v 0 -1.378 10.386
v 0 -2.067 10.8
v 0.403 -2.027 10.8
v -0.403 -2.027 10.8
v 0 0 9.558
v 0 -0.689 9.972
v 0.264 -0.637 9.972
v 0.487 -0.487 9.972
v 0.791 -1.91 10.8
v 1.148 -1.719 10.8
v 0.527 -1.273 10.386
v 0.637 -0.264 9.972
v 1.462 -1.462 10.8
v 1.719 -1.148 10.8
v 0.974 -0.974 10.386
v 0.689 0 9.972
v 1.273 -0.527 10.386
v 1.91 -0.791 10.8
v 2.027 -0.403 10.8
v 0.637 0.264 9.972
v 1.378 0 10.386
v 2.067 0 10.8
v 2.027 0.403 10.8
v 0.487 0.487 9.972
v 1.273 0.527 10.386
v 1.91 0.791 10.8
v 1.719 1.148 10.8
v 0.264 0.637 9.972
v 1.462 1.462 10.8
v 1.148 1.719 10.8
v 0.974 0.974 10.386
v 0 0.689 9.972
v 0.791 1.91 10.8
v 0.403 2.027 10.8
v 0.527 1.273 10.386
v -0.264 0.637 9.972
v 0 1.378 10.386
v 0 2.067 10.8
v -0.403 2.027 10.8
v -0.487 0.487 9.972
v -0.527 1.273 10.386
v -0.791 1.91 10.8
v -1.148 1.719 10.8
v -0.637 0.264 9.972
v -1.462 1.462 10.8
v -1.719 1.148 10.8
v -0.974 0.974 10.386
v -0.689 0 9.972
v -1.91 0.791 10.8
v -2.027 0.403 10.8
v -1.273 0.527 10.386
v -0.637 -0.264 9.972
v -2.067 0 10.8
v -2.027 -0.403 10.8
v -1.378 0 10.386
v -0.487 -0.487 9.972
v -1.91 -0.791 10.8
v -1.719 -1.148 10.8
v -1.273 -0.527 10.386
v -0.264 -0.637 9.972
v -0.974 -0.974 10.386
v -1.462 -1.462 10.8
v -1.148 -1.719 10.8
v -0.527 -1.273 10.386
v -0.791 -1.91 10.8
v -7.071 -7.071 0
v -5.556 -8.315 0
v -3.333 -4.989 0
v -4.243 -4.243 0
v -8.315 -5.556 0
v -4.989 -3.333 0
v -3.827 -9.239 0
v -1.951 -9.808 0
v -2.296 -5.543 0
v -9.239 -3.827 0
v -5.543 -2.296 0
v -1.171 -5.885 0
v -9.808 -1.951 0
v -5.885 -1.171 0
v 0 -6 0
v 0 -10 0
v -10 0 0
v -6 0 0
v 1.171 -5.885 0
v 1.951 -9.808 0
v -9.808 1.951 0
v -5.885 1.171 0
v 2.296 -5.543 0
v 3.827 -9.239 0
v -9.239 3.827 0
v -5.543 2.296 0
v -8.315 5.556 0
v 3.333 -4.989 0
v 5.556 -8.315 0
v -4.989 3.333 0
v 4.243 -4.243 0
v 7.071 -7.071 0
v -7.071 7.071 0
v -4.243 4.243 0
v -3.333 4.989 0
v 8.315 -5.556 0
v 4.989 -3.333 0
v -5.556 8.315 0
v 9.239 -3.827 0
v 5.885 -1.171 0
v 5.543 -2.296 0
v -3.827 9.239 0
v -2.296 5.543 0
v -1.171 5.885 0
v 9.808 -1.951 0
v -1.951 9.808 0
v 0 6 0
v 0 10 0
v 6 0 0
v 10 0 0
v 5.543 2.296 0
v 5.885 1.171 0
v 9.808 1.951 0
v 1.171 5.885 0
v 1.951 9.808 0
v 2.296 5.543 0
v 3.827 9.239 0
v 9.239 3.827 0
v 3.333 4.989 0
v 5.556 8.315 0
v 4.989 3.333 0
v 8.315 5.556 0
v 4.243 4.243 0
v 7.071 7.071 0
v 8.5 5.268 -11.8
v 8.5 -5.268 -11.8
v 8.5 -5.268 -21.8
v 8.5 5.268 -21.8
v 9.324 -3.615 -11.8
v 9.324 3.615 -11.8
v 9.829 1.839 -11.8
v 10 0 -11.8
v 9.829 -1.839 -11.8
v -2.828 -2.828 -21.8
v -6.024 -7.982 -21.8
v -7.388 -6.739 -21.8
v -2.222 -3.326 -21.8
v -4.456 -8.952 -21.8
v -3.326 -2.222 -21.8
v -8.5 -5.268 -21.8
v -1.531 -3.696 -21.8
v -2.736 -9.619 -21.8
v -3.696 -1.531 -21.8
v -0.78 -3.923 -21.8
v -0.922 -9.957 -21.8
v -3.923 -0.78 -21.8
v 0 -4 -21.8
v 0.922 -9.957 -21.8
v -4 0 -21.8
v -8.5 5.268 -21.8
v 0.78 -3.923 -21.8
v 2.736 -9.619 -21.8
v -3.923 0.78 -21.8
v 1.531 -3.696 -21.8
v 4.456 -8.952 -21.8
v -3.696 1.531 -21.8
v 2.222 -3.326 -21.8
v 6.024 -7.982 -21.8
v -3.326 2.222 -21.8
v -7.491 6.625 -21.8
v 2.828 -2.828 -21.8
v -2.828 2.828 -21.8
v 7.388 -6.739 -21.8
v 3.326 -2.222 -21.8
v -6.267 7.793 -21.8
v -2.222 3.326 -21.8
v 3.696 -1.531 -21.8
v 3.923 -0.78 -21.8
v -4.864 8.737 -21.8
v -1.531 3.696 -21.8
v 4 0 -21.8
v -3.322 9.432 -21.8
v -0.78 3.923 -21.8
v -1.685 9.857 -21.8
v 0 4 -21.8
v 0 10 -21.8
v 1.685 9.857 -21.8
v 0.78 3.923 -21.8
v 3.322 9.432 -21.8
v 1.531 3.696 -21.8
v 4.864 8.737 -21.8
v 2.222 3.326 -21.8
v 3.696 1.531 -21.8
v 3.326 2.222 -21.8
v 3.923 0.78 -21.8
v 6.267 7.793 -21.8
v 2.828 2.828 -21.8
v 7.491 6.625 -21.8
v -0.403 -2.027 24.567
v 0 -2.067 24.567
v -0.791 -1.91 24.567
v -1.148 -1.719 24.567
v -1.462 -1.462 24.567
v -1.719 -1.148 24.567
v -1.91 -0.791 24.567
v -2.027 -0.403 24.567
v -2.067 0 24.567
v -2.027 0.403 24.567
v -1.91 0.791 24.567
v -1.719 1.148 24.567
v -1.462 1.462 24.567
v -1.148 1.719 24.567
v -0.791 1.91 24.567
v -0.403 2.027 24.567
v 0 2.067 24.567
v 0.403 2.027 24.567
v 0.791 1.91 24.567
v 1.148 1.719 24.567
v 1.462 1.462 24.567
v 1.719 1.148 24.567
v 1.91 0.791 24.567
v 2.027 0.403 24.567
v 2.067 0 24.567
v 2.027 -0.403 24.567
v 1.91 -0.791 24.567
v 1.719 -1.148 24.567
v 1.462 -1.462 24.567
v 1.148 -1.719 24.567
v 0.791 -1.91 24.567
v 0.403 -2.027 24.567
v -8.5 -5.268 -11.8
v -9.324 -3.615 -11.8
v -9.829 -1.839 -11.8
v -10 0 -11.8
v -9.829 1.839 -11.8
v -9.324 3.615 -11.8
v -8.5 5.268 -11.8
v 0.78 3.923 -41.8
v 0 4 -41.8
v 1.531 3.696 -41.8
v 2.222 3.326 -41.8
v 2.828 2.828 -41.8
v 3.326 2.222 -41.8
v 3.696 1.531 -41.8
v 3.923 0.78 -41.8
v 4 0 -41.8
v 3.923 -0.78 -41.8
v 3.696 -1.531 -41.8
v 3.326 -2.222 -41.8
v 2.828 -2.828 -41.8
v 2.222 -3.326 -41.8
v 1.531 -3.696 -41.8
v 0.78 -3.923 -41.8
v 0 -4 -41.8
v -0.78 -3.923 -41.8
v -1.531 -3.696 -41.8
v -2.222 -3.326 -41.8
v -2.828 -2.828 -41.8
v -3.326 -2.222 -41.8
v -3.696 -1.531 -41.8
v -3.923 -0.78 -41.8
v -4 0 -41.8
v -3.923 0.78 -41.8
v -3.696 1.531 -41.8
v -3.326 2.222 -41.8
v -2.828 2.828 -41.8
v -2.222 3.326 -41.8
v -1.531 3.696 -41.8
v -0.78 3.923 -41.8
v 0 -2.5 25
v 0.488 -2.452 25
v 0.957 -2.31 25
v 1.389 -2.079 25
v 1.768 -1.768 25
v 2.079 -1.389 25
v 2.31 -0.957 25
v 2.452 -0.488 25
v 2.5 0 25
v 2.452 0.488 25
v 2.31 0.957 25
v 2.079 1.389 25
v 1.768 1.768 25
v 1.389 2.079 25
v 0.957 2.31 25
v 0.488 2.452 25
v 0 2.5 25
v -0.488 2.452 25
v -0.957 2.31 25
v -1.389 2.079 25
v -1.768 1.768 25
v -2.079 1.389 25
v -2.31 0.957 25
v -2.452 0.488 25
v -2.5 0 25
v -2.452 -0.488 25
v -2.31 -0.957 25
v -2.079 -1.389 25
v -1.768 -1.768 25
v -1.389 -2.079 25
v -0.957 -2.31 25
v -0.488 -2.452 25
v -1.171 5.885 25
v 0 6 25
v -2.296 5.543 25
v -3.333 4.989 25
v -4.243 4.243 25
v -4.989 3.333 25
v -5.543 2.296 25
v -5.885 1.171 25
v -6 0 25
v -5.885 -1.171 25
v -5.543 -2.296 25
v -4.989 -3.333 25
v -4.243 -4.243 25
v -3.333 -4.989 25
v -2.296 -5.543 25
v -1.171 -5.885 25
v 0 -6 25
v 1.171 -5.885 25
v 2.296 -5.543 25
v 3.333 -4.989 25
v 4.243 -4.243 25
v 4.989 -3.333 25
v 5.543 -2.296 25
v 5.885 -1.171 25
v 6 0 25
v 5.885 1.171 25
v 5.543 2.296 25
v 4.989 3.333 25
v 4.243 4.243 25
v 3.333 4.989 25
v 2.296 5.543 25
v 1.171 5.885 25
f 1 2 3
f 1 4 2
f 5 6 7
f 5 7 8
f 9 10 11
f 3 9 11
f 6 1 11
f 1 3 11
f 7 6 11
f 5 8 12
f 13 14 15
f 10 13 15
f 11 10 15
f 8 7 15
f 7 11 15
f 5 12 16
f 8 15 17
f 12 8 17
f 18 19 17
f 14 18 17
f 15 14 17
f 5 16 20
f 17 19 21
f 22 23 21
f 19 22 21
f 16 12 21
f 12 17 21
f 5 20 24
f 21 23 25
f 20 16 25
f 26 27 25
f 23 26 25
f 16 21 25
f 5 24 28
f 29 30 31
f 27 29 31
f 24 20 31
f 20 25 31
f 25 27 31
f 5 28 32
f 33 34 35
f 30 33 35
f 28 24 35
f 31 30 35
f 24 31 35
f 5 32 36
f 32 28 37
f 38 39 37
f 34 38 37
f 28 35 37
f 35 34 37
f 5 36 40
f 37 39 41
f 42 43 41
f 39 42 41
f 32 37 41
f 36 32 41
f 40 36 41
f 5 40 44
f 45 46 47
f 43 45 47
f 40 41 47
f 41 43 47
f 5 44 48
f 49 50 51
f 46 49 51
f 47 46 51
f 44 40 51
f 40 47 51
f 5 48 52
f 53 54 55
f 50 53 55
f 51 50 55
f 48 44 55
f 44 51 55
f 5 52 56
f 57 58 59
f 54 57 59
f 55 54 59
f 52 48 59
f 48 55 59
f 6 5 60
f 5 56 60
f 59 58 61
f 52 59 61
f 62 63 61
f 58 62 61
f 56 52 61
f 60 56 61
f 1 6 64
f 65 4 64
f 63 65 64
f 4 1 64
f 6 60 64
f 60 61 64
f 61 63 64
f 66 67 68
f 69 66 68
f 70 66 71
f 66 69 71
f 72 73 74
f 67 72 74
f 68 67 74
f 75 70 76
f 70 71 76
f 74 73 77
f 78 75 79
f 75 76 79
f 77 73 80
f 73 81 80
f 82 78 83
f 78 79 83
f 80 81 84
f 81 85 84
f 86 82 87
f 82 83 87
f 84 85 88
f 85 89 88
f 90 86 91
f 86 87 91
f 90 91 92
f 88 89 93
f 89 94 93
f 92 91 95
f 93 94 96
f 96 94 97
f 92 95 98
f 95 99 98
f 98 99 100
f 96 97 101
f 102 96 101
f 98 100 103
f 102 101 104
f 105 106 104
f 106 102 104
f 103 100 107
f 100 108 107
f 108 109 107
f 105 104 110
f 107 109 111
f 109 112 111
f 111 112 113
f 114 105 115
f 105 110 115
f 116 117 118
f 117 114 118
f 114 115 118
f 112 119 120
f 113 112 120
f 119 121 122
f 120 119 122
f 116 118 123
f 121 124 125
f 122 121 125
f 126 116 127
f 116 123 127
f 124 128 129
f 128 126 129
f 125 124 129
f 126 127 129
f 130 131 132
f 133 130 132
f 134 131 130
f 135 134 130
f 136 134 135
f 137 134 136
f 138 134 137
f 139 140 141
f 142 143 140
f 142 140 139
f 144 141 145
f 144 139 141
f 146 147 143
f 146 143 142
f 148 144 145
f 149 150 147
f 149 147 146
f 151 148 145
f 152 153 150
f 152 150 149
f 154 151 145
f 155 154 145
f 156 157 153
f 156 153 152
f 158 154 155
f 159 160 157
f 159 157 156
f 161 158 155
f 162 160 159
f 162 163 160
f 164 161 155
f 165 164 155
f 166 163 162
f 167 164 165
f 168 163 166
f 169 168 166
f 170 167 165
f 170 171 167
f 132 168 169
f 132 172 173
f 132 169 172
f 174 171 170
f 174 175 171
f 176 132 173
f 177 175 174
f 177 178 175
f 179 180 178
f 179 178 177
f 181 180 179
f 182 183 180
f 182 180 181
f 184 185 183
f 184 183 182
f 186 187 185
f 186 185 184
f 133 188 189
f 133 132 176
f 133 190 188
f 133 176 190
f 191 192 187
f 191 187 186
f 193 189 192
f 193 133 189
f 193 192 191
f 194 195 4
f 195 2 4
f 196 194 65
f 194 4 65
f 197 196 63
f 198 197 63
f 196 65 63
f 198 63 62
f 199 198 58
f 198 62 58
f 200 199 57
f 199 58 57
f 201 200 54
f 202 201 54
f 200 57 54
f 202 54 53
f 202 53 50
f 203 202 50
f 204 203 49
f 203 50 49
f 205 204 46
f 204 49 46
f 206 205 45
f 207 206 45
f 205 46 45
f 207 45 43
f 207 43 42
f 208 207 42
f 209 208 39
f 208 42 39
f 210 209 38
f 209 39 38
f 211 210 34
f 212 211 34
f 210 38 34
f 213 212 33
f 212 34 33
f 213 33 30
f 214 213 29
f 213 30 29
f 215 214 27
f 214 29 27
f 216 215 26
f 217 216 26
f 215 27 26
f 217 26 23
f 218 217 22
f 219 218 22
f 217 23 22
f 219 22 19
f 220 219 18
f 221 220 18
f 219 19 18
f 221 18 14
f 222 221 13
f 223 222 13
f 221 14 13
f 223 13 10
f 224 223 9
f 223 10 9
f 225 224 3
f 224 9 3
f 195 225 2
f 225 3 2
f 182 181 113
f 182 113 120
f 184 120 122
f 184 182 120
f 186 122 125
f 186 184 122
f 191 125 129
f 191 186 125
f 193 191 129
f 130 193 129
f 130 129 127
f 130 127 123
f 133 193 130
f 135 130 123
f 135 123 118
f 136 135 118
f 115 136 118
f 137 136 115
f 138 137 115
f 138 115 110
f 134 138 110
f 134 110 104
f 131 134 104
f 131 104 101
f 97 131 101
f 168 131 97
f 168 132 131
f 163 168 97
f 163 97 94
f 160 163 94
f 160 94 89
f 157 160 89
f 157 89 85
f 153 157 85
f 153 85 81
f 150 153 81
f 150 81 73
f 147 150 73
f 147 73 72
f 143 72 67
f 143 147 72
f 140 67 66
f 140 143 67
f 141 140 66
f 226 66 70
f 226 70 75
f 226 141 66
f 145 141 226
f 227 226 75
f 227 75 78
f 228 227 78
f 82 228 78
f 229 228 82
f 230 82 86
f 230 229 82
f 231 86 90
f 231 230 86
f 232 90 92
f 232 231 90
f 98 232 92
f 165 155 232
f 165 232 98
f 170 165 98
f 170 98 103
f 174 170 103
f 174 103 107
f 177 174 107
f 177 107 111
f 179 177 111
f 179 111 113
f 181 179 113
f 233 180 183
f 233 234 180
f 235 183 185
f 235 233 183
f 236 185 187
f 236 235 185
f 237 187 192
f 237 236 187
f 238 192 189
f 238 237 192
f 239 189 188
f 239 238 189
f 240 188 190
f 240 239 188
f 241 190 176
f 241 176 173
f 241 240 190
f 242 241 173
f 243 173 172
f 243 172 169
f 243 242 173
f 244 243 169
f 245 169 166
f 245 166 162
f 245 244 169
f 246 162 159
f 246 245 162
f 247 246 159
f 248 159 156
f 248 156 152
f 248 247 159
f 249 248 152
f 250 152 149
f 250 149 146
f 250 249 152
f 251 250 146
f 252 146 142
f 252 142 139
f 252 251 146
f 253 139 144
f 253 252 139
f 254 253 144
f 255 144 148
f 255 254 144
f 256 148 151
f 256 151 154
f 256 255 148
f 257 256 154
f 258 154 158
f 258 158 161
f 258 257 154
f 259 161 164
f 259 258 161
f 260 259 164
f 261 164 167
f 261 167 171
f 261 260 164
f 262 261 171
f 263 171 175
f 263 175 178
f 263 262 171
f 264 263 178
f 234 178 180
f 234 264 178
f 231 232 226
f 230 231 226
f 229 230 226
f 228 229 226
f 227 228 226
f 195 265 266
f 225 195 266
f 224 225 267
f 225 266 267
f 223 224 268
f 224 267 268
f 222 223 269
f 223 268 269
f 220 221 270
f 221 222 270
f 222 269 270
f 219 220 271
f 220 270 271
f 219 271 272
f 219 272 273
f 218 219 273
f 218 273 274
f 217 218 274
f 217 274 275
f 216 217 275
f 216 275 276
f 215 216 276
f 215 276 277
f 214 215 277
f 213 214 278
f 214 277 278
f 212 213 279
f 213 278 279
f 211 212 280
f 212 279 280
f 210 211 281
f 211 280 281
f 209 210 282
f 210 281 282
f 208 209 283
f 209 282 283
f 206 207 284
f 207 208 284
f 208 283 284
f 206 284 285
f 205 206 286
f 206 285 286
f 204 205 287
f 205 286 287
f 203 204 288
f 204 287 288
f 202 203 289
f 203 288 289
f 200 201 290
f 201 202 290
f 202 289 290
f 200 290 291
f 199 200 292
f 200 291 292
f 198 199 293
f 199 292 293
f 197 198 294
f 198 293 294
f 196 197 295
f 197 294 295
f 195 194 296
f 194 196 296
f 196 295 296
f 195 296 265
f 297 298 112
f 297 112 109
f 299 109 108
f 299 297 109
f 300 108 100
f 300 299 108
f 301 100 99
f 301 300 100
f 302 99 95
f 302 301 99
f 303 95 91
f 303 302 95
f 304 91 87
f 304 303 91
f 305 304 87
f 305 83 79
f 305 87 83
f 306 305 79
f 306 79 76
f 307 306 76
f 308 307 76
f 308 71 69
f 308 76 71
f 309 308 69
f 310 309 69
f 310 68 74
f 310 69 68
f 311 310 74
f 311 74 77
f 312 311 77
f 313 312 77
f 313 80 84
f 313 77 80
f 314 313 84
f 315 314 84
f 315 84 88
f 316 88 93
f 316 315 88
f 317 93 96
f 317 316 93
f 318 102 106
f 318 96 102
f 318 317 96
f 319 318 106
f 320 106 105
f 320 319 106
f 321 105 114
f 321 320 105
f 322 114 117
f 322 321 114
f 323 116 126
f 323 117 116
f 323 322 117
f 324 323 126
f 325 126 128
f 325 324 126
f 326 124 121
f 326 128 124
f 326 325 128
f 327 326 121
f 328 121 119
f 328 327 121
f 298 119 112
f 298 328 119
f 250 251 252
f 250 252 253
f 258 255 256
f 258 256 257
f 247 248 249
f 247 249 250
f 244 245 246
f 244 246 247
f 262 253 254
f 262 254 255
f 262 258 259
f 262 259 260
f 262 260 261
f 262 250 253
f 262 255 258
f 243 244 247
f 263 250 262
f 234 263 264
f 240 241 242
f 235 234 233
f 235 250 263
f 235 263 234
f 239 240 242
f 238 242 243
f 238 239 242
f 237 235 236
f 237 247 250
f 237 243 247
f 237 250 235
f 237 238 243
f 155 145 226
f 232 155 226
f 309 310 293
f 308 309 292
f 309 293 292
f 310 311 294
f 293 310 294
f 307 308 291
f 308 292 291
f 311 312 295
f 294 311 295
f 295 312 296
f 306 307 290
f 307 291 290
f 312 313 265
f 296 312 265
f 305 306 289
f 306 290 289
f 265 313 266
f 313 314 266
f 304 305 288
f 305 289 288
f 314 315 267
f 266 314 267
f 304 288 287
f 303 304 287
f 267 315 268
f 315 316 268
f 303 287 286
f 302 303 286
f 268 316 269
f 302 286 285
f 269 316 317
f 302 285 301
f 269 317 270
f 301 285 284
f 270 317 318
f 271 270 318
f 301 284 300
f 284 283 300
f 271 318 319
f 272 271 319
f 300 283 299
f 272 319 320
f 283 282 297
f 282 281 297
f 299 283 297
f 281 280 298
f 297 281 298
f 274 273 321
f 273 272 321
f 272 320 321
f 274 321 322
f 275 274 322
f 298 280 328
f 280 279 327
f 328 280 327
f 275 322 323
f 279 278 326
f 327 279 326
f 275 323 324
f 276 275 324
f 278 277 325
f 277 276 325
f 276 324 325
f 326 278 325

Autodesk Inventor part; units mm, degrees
ref_plane "YZ Plane" through (0, 0, 0) normal (1, 0, 0) x (0, 1, 0)
ref_plane "XZ Plane" through (0, 0, 0) normal (0, 1, 0) x (-1, 0, 0)
ref_plane "XY Plane" through (0, 0, 0) normal (0, 0, 1) x (1, 0, 0)
sketch "Skizze1" plane through (0, 0, 0) normal (1, 0, 0) x (0, 1, 0)
  line L0 (0, 38.36) -> (0, -55.16) projected
  line L1 (-2, 0) -> (12, 0) construction
  line L2 (6, 0) -> (6, 25)
  line L3 (6, 25) -> (0, 25)
  line L4 (6, 0) -> (10, 0)
  line L5 (10, 0) -> (10, -21.8)
  line L6 (10, -21.8) -> (4, -21.8)
  line L7 (4, -21.8) -> (4, -41.8)
  line L8 (4, -41.8) -> (0, -41.8)
  line L9 (0, -41.8) -> (0, 25)
  point P0 (0, 0)
  dimension "d0" = 12
  dimension "d1" = 25
  dimension "d3" = 8
  dimension "d4" = 21.8
  dimension "d6" = 20
  dimension "d23" = 20
revolve "Grundkörper" add sketch "Skizze1" angle 360 about axis through (0, 0, 0) along (0, 0, -1)
thread "M8" size "M8x1.25" class "6g" standard "ANSI Metric M Profile" full length
sketch "Skizze2" plane through (0, 0, 25) normal (0, 0, 1) x (1, 0, 0)
  circle A0 centre (0, 0) radius 6 projected
hole "M5x10" at (0, 0, 25) direction (0, 0, -1) diameter 4.134 depth 14.2 tip angle 118 countersink diameter 5 countersink angle 90 thread size "M5x0.8" class "6H" standard "ISO Metric profile"
sketch "Skizze3" plane through (0, 0, 0) normal (0, 1, 0) x (-1, 0, 0)
  line L0 (0, -24.96) -> (0, 4.16) construction
  line L1 (-10, -21.8) -> (10, -21.8) construction
  line L2 (10, 0) -> (10, -21.8) construction
  line L3 (-10, 0) -> (-10, -21.8) construction
  line L4 (8.5, -21.8) -> (8.5, -11.8)
  line L5 (8.5, -11.8) -> (10, -11.8)
  line L6 (10, -11.8) -> (10, -21.8)
  line L7 (10, -21.8) -> (8.5, -21.8)
  line L8 (-10, -11.8) -> (-8.5, -11.8)
  line L9 (-8.5, -11.8) -> (-8.5, -21.8)
  line L10 (-8.5, -21.8) -> (-10, -21.8)
  line L11 (-10, -21.8) -> (-10, -11.8)
  point P0 (0, 0)
  dimension "d24" = 10
  dimension "d25" = 17
extrude "Extrusion1" cut sketch "Skizze3" along normal through all both and the other way through all
properties part number "200-60-DIFFERENTIAL-CONNECTOR-02" material "Edelstahl"
